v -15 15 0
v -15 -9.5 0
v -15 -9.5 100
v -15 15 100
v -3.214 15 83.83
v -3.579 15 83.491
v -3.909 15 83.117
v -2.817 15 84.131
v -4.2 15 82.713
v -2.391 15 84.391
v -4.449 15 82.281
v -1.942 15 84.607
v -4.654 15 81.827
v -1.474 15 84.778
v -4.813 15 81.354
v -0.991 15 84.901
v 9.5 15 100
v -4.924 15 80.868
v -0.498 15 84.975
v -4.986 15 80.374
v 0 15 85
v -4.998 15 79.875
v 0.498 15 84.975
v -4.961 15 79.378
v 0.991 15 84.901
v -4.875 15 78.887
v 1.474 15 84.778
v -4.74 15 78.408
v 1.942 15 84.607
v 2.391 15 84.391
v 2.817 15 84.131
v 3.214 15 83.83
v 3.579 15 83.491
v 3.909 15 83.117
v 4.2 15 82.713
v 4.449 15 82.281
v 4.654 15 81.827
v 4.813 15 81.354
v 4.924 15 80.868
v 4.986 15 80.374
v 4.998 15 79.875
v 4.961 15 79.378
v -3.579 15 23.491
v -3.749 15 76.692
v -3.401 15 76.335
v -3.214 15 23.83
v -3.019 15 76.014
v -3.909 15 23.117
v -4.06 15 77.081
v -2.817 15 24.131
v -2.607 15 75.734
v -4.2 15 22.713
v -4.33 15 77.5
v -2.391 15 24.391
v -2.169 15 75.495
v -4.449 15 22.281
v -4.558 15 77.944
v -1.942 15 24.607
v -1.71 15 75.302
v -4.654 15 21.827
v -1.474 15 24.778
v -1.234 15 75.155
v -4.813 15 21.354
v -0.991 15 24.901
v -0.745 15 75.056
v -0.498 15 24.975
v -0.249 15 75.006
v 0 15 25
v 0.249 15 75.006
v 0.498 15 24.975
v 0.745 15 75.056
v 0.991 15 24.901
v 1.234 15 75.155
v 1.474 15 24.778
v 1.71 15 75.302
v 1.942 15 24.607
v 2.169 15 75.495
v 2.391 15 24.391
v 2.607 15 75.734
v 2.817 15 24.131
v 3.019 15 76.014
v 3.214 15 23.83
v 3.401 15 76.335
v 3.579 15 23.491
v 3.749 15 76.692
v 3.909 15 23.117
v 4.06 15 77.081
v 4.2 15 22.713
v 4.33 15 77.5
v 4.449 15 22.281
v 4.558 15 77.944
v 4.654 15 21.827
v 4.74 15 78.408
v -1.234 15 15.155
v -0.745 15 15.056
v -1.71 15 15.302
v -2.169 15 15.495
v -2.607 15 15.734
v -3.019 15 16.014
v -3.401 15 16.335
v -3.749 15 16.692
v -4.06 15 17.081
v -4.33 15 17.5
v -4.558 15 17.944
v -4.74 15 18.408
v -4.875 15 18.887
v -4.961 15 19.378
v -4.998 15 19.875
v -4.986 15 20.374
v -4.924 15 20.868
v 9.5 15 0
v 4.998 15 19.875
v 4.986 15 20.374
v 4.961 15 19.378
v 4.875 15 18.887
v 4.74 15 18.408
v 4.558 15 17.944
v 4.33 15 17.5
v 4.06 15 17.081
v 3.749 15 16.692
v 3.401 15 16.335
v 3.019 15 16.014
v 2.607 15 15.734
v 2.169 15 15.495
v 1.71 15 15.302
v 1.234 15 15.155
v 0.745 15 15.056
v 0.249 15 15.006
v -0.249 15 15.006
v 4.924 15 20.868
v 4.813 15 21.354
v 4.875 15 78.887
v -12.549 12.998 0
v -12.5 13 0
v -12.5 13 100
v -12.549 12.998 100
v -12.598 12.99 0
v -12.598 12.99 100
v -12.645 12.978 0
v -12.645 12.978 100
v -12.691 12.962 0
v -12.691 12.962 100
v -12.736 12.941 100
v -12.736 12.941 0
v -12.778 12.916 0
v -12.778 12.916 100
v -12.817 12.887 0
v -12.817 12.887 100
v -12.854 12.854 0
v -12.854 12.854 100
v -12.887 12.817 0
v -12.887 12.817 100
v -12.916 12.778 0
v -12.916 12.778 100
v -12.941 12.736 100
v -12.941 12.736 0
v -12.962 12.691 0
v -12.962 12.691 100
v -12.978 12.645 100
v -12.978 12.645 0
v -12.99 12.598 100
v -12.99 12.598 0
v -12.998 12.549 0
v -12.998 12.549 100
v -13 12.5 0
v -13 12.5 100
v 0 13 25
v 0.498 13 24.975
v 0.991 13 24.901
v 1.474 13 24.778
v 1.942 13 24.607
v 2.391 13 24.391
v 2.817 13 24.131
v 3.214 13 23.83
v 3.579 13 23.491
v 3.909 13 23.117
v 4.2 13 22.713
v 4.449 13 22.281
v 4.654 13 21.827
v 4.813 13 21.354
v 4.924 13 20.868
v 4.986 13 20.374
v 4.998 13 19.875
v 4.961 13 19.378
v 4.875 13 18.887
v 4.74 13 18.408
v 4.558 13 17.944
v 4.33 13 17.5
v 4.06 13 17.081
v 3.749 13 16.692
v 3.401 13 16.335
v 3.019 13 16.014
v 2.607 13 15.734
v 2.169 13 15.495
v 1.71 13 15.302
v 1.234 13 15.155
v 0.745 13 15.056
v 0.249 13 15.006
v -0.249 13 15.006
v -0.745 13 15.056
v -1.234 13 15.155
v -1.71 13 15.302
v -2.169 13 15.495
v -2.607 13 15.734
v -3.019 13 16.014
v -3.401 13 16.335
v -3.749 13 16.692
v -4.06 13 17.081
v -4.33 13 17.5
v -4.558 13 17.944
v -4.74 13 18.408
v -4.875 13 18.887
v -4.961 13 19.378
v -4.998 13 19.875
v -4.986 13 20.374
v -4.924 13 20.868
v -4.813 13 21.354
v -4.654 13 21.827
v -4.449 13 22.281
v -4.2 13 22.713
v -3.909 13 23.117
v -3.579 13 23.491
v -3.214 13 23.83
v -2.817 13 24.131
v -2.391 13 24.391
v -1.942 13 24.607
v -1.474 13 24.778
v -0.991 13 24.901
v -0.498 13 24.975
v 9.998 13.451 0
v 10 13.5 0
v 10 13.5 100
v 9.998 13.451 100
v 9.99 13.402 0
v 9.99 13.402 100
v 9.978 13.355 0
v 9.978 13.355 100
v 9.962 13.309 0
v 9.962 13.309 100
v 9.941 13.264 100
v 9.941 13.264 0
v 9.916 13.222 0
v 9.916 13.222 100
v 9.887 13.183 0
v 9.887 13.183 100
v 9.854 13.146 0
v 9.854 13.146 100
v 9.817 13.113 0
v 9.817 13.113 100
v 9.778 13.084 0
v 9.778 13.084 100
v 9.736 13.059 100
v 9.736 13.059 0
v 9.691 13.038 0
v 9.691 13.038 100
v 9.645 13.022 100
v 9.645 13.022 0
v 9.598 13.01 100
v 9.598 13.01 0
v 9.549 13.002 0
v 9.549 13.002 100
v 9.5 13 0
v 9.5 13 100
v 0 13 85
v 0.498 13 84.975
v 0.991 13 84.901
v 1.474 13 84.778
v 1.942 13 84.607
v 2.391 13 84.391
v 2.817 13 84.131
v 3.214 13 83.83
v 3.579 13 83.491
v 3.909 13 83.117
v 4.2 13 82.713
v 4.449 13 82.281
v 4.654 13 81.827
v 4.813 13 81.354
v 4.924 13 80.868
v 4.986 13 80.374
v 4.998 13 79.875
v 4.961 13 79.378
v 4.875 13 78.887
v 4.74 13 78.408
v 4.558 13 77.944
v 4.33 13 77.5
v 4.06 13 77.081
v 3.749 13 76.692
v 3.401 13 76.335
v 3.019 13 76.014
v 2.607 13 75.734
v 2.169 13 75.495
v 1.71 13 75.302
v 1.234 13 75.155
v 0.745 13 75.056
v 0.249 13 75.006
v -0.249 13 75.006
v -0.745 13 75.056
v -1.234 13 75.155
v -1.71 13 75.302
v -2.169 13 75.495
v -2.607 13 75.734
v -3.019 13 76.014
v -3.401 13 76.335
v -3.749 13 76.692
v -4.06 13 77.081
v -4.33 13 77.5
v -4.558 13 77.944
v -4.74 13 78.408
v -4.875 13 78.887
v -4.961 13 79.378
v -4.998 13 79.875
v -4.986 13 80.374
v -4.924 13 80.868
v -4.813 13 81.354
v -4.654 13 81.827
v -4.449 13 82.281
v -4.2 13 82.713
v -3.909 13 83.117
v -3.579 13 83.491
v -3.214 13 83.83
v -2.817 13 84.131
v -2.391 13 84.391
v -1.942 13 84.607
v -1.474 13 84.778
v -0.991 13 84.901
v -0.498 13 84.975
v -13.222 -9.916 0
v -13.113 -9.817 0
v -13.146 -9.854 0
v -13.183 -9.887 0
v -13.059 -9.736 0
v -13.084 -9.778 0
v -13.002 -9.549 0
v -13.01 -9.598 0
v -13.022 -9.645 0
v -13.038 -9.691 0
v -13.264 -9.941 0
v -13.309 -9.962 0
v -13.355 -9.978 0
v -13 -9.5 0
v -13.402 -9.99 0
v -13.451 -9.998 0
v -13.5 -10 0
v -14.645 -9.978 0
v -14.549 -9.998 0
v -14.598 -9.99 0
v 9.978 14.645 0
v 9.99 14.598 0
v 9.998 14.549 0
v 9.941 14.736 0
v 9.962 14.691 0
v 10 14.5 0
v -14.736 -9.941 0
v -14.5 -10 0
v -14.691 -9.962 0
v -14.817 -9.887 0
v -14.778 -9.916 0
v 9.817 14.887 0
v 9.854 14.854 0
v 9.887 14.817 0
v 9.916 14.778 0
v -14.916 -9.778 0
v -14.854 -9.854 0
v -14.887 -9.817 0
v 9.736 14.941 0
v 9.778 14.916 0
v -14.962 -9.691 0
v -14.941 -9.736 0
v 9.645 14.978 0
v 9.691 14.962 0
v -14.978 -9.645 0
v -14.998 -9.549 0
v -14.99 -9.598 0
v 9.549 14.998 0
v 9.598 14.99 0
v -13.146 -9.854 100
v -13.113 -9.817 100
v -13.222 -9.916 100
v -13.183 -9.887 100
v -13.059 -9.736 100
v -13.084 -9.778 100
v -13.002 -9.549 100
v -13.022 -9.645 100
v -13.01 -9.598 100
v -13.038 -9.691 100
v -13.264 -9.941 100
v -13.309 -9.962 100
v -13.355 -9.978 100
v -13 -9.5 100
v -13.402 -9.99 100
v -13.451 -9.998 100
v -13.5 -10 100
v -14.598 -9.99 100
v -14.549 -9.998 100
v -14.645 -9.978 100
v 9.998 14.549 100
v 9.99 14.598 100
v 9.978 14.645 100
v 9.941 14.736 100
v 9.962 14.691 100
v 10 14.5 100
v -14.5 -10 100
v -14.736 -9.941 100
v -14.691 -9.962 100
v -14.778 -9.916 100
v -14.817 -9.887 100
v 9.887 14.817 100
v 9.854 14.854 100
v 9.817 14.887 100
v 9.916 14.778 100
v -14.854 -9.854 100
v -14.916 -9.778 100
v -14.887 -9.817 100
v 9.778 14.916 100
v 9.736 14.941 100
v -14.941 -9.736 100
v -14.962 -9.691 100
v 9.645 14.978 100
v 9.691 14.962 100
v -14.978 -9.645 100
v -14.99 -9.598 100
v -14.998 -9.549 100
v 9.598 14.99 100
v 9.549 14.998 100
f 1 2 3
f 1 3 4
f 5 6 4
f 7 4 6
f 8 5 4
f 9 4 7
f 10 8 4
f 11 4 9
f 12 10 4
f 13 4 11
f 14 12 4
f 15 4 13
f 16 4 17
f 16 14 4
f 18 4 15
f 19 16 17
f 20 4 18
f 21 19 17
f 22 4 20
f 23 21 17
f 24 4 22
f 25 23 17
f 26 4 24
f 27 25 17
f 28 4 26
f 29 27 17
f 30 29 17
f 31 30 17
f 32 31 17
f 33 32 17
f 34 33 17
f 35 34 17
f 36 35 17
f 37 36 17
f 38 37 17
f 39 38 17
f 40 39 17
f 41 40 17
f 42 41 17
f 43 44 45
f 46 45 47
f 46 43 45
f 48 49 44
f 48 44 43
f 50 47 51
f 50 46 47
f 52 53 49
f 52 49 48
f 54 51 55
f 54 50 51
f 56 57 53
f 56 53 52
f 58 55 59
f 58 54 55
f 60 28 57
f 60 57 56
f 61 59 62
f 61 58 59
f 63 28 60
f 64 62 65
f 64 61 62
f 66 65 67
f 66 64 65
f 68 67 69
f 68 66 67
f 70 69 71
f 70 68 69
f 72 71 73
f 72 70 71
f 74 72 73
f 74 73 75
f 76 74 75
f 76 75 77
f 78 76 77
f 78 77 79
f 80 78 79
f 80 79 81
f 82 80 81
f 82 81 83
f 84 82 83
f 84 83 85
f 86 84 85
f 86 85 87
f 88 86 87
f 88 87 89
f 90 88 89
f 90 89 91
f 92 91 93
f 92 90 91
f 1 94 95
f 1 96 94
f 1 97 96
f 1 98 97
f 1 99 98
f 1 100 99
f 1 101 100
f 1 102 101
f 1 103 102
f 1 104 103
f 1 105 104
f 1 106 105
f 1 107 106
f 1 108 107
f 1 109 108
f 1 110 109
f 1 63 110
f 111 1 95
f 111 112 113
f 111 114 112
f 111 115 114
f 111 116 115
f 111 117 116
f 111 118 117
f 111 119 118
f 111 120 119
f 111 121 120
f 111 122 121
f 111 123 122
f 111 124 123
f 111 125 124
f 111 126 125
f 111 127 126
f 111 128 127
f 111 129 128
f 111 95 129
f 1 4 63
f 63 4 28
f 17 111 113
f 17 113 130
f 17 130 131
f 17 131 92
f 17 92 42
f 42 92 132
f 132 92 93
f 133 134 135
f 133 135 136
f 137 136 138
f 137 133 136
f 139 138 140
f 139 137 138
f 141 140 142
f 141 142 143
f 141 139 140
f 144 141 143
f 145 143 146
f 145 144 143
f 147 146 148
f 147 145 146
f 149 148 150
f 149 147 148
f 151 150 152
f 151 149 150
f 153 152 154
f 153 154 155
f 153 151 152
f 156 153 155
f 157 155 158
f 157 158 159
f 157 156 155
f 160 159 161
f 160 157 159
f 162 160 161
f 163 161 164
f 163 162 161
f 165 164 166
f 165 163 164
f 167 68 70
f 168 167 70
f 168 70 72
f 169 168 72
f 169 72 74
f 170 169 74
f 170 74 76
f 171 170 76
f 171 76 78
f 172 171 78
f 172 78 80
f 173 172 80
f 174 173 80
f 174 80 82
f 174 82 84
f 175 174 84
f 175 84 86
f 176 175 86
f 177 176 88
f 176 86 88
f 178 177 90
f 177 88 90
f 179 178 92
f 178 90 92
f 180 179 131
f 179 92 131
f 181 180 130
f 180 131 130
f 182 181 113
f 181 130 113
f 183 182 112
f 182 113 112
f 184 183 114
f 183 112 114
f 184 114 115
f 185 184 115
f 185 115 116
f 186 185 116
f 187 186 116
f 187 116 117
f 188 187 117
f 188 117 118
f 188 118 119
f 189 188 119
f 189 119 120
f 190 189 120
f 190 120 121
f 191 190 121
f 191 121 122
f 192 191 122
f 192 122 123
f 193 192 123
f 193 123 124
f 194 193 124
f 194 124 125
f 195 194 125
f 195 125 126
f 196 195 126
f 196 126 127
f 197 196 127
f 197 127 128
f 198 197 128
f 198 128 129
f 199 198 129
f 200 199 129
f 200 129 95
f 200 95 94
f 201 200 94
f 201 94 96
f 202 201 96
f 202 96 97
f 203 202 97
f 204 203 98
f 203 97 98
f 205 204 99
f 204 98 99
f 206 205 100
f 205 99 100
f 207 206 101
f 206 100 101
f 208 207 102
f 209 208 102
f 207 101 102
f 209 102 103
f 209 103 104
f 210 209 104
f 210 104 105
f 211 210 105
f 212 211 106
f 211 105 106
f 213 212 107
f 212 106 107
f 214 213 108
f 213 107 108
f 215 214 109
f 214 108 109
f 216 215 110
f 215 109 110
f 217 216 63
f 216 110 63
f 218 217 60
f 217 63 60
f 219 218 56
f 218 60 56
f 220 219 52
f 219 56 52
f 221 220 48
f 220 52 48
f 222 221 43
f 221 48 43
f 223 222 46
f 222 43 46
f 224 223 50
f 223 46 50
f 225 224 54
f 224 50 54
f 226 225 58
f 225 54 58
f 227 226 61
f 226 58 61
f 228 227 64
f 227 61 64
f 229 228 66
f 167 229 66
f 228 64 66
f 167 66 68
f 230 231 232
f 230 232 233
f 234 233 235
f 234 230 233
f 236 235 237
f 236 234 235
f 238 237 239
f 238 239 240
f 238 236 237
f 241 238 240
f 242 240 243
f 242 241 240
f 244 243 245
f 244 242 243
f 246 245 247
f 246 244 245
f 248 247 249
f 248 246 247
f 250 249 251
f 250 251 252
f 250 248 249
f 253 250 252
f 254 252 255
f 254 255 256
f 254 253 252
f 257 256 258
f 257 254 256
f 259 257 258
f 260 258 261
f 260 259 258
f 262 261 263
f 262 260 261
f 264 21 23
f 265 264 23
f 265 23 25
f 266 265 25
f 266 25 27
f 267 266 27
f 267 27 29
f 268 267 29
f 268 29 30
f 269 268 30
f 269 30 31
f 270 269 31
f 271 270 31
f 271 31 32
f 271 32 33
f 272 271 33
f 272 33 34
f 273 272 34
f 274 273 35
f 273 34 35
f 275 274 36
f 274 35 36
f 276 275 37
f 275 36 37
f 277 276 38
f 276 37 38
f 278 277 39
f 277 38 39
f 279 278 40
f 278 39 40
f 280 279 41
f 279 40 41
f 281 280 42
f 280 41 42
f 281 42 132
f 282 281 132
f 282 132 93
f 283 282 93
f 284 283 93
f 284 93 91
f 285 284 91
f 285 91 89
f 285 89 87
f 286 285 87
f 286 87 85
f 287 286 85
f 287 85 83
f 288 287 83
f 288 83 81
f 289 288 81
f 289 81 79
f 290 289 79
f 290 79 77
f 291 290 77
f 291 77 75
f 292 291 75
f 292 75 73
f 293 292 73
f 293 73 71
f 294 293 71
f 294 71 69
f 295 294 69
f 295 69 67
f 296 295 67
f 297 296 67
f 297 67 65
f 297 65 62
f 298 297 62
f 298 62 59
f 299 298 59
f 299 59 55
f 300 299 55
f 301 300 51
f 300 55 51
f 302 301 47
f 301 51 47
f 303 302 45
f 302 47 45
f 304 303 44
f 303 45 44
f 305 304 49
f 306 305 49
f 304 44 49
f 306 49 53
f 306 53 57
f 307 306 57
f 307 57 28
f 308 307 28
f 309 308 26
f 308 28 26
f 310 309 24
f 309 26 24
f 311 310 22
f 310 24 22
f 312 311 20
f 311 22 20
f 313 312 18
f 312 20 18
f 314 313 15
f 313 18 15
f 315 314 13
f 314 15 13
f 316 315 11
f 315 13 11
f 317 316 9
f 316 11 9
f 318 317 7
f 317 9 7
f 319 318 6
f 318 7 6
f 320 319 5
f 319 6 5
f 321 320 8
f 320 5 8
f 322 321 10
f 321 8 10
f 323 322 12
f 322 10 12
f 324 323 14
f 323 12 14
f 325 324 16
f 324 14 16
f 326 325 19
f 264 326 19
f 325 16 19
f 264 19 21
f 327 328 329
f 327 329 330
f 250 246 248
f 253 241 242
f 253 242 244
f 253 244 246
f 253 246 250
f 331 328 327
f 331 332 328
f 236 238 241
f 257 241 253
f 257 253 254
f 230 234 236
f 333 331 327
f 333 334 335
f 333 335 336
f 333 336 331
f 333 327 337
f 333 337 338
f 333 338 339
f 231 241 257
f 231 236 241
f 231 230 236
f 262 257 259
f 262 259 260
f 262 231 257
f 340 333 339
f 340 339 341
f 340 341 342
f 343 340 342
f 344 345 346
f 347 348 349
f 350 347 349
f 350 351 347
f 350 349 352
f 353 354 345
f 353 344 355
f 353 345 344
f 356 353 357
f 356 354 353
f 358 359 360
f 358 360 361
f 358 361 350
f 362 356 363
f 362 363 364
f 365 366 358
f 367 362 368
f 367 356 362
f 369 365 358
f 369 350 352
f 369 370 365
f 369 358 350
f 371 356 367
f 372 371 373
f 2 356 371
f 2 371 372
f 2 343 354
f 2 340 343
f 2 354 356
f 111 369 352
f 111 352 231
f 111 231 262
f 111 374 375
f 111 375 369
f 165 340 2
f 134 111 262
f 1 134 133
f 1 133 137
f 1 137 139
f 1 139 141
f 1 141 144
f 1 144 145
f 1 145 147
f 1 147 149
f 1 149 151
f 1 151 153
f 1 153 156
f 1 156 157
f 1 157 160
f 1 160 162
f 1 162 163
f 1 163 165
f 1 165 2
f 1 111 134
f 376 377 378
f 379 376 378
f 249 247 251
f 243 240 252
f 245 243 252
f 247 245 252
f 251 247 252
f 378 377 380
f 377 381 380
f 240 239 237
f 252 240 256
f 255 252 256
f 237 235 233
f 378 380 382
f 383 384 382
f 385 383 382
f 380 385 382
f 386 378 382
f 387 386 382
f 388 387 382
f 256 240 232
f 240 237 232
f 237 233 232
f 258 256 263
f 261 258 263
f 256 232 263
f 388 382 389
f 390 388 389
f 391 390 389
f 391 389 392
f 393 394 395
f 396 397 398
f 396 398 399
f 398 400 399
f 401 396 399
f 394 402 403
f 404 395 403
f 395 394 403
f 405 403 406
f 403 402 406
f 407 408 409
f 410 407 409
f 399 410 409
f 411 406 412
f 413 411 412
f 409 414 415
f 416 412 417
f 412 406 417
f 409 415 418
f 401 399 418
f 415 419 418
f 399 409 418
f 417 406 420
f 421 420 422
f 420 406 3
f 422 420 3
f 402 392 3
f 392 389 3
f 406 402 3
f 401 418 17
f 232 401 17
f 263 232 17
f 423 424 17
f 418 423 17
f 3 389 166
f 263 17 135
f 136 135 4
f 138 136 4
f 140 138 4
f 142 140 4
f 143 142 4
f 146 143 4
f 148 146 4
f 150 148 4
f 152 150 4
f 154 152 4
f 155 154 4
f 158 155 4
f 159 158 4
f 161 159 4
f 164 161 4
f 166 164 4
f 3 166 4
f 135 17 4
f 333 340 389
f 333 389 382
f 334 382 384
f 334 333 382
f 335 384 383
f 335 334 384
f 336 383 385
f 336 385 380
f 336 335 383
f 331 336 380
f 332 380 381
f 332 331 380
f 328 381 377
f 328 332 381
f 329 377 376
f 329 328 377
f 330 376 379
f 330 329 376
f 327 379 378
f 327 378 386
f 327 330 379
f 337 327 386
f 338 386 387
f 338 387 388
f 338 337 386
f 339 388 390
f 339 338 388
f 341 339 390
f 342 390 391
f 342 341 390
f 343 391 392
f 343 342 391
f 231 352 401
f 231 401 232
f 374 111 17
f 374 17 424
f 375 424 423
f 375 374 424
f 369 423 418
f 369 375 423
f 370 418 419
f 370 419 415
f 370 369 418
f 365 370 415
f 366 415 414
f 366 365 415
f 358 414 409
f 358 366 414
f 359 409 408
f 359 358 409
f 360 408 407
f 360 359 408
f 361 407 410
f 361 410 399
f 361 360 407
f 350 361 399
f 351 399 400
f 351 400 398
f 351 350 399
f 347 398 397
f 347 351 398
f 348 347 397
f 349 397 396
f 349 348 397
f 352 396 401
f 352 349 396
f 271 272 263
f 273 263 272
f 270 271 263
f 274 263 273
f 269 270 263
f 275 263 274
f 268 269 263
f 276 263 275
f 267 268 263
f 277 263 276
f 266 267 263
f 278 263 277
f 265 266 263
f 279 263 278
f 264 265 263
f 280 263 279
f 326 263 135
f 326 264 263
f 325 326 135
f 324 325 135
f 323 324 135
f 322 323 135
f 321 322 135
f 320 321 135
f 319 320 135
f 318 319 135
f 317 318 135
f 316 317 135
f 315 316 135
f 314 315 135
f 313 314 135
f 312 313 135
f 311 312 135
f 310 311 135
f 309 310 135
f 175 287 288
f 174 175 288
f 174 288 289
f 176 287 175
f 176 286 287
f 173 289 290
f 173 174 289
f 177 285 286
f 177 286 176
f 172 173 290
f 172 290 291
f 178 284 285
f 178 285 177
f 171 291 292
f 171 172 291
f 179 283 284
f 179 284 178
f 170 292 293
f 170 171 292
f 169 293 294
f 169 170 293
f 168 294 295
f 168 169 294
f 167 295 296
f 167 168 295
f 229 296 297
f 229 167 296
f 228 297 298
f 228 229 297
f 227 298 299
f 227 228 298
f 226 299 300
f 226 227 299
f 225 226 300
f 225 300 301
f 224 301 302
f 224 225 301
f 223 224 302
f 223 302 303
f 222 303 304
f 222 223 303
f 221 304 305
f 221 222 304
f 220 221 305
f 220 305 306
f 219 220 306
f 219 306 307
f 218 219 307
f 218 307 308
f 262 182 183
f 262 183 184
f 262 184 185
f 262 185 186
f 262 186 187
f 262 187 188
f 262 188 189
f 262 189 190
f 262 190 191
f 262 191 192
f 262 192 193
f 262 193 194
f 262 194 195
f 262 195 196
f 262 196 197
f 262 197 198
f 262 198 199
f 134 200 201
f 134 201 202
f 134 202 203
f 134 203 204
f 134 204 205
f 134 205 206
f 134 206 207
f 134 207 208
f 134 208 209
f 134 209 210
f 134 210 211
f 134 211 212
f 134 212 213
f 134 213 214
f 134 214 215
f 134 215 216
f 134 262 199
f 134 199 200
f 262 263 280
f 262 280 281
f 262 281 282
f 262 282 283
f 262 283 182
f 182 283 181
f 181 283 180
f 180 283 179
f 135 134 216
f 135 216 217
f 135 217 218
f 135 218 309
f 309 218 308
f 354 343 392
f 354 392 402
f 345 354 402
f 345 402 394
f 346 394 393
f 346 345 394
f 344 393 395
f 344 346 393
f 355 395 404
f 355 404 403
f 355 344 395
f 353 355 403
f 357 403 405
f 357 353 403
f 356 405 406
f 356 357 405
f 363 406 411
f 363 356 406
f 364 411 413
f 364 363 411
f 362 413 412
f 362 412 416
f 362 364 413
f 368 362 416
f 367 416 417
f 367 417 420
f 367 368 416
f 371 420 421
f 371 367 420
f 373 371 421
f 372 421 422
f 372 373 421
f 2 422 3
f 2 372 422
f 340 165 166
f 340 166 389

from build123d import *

# Parameters (mm, degrees)
EXTRUDE_1_DEPTH     = 100
CUT_EXTRUDE_1_REACH = 106.163
SKETCH_2_R          = 5


with BuildPart() as part:
    # Эскиз1 → Бобышка-Вытянуть1 (new body)
    with BuildSketch(Plane.XY):
        with BuildLine():
            Line((10, 14.5), (10, 13.5))
            ThreePointArc((10, 13.5), (9.853553391, 13.146446609), (9.5, 13))
            Line((9.5, 13), (-12.5, 13))
            ThreePointArc((-12.5, 13), (-12.853553391, 12.853553391), (-13, 12.5))
            Line((-13, 12.5), (-13, -9.5))
            ThreePointArc((-13, -9.5), (-13.146446609, -9.853553391), (-13.5, -10))
            Line((-13.5, -10), (-14.5, -10))
            ThreePointArc((-14.5, -10), (-14.853553391, -9.853553391), (-15, -9.5))
            Line((-15, -9.5), (-15, 15))
            Line((-15, 15), (9.5, 15))
            ThreePointArc((9.5, 15), (9.853553391, 14.853553391), (10, 14.5))
        make_face()
    extrude(amount=EXTRUDE_1_DEPTH)

    # Эскиз2 → Вырез-Вытянуть1 (cut, up to next)
    with BuildSketch(Plane(origin=(0, 15, 0), x_dir=(1, 0, 0), z_dir=(0, 1, 0)), mode=Mode.PRIVATE) as cut_extrude_1_sk1:
        with Locations(Location((0, -80, 0), (0, 0, 270))):
            Circle(SKETCH_2_R)
    cut_extrude_1_tool1 = extrude(cut_extrude_1_sk1.sketch, amount=-CUT_EXTRUDE_1_REACH, mode=Mode.PRIVATE) & part.part
    # Эскиз2 → Вырез-Вытянуть1 (cut, up to next)
    with BuildSketch(Plane(origin=(0, 15, 0), x_dir=(1, 0, 0), z_dir=(0, 1, 0)), mode=Mode.PRIVATE) as cut_extrude_1_sk2:
        with Locations(Location((0, -20, 0), (0, 0, 270))):
            Circle(SKETCH_2_R)
    cut_extrude_1_tool2 = extrude(cut_extrude_1_sk2.sketch, amount=-CUT_EXTRUDE_1_REACH, mode=Mode.PRIVATE) & part.part
    add(cut_extrude_1_tool1.solids().sort_by_distance((0, 15, 80))[0], mode=Mode.SUBTRACT)
    add(cut_extrude_1_tool2.solids().sort_by_distance((0, 15, 20))[0], mode=Mode.SUBTRACT)


solid = part.part
